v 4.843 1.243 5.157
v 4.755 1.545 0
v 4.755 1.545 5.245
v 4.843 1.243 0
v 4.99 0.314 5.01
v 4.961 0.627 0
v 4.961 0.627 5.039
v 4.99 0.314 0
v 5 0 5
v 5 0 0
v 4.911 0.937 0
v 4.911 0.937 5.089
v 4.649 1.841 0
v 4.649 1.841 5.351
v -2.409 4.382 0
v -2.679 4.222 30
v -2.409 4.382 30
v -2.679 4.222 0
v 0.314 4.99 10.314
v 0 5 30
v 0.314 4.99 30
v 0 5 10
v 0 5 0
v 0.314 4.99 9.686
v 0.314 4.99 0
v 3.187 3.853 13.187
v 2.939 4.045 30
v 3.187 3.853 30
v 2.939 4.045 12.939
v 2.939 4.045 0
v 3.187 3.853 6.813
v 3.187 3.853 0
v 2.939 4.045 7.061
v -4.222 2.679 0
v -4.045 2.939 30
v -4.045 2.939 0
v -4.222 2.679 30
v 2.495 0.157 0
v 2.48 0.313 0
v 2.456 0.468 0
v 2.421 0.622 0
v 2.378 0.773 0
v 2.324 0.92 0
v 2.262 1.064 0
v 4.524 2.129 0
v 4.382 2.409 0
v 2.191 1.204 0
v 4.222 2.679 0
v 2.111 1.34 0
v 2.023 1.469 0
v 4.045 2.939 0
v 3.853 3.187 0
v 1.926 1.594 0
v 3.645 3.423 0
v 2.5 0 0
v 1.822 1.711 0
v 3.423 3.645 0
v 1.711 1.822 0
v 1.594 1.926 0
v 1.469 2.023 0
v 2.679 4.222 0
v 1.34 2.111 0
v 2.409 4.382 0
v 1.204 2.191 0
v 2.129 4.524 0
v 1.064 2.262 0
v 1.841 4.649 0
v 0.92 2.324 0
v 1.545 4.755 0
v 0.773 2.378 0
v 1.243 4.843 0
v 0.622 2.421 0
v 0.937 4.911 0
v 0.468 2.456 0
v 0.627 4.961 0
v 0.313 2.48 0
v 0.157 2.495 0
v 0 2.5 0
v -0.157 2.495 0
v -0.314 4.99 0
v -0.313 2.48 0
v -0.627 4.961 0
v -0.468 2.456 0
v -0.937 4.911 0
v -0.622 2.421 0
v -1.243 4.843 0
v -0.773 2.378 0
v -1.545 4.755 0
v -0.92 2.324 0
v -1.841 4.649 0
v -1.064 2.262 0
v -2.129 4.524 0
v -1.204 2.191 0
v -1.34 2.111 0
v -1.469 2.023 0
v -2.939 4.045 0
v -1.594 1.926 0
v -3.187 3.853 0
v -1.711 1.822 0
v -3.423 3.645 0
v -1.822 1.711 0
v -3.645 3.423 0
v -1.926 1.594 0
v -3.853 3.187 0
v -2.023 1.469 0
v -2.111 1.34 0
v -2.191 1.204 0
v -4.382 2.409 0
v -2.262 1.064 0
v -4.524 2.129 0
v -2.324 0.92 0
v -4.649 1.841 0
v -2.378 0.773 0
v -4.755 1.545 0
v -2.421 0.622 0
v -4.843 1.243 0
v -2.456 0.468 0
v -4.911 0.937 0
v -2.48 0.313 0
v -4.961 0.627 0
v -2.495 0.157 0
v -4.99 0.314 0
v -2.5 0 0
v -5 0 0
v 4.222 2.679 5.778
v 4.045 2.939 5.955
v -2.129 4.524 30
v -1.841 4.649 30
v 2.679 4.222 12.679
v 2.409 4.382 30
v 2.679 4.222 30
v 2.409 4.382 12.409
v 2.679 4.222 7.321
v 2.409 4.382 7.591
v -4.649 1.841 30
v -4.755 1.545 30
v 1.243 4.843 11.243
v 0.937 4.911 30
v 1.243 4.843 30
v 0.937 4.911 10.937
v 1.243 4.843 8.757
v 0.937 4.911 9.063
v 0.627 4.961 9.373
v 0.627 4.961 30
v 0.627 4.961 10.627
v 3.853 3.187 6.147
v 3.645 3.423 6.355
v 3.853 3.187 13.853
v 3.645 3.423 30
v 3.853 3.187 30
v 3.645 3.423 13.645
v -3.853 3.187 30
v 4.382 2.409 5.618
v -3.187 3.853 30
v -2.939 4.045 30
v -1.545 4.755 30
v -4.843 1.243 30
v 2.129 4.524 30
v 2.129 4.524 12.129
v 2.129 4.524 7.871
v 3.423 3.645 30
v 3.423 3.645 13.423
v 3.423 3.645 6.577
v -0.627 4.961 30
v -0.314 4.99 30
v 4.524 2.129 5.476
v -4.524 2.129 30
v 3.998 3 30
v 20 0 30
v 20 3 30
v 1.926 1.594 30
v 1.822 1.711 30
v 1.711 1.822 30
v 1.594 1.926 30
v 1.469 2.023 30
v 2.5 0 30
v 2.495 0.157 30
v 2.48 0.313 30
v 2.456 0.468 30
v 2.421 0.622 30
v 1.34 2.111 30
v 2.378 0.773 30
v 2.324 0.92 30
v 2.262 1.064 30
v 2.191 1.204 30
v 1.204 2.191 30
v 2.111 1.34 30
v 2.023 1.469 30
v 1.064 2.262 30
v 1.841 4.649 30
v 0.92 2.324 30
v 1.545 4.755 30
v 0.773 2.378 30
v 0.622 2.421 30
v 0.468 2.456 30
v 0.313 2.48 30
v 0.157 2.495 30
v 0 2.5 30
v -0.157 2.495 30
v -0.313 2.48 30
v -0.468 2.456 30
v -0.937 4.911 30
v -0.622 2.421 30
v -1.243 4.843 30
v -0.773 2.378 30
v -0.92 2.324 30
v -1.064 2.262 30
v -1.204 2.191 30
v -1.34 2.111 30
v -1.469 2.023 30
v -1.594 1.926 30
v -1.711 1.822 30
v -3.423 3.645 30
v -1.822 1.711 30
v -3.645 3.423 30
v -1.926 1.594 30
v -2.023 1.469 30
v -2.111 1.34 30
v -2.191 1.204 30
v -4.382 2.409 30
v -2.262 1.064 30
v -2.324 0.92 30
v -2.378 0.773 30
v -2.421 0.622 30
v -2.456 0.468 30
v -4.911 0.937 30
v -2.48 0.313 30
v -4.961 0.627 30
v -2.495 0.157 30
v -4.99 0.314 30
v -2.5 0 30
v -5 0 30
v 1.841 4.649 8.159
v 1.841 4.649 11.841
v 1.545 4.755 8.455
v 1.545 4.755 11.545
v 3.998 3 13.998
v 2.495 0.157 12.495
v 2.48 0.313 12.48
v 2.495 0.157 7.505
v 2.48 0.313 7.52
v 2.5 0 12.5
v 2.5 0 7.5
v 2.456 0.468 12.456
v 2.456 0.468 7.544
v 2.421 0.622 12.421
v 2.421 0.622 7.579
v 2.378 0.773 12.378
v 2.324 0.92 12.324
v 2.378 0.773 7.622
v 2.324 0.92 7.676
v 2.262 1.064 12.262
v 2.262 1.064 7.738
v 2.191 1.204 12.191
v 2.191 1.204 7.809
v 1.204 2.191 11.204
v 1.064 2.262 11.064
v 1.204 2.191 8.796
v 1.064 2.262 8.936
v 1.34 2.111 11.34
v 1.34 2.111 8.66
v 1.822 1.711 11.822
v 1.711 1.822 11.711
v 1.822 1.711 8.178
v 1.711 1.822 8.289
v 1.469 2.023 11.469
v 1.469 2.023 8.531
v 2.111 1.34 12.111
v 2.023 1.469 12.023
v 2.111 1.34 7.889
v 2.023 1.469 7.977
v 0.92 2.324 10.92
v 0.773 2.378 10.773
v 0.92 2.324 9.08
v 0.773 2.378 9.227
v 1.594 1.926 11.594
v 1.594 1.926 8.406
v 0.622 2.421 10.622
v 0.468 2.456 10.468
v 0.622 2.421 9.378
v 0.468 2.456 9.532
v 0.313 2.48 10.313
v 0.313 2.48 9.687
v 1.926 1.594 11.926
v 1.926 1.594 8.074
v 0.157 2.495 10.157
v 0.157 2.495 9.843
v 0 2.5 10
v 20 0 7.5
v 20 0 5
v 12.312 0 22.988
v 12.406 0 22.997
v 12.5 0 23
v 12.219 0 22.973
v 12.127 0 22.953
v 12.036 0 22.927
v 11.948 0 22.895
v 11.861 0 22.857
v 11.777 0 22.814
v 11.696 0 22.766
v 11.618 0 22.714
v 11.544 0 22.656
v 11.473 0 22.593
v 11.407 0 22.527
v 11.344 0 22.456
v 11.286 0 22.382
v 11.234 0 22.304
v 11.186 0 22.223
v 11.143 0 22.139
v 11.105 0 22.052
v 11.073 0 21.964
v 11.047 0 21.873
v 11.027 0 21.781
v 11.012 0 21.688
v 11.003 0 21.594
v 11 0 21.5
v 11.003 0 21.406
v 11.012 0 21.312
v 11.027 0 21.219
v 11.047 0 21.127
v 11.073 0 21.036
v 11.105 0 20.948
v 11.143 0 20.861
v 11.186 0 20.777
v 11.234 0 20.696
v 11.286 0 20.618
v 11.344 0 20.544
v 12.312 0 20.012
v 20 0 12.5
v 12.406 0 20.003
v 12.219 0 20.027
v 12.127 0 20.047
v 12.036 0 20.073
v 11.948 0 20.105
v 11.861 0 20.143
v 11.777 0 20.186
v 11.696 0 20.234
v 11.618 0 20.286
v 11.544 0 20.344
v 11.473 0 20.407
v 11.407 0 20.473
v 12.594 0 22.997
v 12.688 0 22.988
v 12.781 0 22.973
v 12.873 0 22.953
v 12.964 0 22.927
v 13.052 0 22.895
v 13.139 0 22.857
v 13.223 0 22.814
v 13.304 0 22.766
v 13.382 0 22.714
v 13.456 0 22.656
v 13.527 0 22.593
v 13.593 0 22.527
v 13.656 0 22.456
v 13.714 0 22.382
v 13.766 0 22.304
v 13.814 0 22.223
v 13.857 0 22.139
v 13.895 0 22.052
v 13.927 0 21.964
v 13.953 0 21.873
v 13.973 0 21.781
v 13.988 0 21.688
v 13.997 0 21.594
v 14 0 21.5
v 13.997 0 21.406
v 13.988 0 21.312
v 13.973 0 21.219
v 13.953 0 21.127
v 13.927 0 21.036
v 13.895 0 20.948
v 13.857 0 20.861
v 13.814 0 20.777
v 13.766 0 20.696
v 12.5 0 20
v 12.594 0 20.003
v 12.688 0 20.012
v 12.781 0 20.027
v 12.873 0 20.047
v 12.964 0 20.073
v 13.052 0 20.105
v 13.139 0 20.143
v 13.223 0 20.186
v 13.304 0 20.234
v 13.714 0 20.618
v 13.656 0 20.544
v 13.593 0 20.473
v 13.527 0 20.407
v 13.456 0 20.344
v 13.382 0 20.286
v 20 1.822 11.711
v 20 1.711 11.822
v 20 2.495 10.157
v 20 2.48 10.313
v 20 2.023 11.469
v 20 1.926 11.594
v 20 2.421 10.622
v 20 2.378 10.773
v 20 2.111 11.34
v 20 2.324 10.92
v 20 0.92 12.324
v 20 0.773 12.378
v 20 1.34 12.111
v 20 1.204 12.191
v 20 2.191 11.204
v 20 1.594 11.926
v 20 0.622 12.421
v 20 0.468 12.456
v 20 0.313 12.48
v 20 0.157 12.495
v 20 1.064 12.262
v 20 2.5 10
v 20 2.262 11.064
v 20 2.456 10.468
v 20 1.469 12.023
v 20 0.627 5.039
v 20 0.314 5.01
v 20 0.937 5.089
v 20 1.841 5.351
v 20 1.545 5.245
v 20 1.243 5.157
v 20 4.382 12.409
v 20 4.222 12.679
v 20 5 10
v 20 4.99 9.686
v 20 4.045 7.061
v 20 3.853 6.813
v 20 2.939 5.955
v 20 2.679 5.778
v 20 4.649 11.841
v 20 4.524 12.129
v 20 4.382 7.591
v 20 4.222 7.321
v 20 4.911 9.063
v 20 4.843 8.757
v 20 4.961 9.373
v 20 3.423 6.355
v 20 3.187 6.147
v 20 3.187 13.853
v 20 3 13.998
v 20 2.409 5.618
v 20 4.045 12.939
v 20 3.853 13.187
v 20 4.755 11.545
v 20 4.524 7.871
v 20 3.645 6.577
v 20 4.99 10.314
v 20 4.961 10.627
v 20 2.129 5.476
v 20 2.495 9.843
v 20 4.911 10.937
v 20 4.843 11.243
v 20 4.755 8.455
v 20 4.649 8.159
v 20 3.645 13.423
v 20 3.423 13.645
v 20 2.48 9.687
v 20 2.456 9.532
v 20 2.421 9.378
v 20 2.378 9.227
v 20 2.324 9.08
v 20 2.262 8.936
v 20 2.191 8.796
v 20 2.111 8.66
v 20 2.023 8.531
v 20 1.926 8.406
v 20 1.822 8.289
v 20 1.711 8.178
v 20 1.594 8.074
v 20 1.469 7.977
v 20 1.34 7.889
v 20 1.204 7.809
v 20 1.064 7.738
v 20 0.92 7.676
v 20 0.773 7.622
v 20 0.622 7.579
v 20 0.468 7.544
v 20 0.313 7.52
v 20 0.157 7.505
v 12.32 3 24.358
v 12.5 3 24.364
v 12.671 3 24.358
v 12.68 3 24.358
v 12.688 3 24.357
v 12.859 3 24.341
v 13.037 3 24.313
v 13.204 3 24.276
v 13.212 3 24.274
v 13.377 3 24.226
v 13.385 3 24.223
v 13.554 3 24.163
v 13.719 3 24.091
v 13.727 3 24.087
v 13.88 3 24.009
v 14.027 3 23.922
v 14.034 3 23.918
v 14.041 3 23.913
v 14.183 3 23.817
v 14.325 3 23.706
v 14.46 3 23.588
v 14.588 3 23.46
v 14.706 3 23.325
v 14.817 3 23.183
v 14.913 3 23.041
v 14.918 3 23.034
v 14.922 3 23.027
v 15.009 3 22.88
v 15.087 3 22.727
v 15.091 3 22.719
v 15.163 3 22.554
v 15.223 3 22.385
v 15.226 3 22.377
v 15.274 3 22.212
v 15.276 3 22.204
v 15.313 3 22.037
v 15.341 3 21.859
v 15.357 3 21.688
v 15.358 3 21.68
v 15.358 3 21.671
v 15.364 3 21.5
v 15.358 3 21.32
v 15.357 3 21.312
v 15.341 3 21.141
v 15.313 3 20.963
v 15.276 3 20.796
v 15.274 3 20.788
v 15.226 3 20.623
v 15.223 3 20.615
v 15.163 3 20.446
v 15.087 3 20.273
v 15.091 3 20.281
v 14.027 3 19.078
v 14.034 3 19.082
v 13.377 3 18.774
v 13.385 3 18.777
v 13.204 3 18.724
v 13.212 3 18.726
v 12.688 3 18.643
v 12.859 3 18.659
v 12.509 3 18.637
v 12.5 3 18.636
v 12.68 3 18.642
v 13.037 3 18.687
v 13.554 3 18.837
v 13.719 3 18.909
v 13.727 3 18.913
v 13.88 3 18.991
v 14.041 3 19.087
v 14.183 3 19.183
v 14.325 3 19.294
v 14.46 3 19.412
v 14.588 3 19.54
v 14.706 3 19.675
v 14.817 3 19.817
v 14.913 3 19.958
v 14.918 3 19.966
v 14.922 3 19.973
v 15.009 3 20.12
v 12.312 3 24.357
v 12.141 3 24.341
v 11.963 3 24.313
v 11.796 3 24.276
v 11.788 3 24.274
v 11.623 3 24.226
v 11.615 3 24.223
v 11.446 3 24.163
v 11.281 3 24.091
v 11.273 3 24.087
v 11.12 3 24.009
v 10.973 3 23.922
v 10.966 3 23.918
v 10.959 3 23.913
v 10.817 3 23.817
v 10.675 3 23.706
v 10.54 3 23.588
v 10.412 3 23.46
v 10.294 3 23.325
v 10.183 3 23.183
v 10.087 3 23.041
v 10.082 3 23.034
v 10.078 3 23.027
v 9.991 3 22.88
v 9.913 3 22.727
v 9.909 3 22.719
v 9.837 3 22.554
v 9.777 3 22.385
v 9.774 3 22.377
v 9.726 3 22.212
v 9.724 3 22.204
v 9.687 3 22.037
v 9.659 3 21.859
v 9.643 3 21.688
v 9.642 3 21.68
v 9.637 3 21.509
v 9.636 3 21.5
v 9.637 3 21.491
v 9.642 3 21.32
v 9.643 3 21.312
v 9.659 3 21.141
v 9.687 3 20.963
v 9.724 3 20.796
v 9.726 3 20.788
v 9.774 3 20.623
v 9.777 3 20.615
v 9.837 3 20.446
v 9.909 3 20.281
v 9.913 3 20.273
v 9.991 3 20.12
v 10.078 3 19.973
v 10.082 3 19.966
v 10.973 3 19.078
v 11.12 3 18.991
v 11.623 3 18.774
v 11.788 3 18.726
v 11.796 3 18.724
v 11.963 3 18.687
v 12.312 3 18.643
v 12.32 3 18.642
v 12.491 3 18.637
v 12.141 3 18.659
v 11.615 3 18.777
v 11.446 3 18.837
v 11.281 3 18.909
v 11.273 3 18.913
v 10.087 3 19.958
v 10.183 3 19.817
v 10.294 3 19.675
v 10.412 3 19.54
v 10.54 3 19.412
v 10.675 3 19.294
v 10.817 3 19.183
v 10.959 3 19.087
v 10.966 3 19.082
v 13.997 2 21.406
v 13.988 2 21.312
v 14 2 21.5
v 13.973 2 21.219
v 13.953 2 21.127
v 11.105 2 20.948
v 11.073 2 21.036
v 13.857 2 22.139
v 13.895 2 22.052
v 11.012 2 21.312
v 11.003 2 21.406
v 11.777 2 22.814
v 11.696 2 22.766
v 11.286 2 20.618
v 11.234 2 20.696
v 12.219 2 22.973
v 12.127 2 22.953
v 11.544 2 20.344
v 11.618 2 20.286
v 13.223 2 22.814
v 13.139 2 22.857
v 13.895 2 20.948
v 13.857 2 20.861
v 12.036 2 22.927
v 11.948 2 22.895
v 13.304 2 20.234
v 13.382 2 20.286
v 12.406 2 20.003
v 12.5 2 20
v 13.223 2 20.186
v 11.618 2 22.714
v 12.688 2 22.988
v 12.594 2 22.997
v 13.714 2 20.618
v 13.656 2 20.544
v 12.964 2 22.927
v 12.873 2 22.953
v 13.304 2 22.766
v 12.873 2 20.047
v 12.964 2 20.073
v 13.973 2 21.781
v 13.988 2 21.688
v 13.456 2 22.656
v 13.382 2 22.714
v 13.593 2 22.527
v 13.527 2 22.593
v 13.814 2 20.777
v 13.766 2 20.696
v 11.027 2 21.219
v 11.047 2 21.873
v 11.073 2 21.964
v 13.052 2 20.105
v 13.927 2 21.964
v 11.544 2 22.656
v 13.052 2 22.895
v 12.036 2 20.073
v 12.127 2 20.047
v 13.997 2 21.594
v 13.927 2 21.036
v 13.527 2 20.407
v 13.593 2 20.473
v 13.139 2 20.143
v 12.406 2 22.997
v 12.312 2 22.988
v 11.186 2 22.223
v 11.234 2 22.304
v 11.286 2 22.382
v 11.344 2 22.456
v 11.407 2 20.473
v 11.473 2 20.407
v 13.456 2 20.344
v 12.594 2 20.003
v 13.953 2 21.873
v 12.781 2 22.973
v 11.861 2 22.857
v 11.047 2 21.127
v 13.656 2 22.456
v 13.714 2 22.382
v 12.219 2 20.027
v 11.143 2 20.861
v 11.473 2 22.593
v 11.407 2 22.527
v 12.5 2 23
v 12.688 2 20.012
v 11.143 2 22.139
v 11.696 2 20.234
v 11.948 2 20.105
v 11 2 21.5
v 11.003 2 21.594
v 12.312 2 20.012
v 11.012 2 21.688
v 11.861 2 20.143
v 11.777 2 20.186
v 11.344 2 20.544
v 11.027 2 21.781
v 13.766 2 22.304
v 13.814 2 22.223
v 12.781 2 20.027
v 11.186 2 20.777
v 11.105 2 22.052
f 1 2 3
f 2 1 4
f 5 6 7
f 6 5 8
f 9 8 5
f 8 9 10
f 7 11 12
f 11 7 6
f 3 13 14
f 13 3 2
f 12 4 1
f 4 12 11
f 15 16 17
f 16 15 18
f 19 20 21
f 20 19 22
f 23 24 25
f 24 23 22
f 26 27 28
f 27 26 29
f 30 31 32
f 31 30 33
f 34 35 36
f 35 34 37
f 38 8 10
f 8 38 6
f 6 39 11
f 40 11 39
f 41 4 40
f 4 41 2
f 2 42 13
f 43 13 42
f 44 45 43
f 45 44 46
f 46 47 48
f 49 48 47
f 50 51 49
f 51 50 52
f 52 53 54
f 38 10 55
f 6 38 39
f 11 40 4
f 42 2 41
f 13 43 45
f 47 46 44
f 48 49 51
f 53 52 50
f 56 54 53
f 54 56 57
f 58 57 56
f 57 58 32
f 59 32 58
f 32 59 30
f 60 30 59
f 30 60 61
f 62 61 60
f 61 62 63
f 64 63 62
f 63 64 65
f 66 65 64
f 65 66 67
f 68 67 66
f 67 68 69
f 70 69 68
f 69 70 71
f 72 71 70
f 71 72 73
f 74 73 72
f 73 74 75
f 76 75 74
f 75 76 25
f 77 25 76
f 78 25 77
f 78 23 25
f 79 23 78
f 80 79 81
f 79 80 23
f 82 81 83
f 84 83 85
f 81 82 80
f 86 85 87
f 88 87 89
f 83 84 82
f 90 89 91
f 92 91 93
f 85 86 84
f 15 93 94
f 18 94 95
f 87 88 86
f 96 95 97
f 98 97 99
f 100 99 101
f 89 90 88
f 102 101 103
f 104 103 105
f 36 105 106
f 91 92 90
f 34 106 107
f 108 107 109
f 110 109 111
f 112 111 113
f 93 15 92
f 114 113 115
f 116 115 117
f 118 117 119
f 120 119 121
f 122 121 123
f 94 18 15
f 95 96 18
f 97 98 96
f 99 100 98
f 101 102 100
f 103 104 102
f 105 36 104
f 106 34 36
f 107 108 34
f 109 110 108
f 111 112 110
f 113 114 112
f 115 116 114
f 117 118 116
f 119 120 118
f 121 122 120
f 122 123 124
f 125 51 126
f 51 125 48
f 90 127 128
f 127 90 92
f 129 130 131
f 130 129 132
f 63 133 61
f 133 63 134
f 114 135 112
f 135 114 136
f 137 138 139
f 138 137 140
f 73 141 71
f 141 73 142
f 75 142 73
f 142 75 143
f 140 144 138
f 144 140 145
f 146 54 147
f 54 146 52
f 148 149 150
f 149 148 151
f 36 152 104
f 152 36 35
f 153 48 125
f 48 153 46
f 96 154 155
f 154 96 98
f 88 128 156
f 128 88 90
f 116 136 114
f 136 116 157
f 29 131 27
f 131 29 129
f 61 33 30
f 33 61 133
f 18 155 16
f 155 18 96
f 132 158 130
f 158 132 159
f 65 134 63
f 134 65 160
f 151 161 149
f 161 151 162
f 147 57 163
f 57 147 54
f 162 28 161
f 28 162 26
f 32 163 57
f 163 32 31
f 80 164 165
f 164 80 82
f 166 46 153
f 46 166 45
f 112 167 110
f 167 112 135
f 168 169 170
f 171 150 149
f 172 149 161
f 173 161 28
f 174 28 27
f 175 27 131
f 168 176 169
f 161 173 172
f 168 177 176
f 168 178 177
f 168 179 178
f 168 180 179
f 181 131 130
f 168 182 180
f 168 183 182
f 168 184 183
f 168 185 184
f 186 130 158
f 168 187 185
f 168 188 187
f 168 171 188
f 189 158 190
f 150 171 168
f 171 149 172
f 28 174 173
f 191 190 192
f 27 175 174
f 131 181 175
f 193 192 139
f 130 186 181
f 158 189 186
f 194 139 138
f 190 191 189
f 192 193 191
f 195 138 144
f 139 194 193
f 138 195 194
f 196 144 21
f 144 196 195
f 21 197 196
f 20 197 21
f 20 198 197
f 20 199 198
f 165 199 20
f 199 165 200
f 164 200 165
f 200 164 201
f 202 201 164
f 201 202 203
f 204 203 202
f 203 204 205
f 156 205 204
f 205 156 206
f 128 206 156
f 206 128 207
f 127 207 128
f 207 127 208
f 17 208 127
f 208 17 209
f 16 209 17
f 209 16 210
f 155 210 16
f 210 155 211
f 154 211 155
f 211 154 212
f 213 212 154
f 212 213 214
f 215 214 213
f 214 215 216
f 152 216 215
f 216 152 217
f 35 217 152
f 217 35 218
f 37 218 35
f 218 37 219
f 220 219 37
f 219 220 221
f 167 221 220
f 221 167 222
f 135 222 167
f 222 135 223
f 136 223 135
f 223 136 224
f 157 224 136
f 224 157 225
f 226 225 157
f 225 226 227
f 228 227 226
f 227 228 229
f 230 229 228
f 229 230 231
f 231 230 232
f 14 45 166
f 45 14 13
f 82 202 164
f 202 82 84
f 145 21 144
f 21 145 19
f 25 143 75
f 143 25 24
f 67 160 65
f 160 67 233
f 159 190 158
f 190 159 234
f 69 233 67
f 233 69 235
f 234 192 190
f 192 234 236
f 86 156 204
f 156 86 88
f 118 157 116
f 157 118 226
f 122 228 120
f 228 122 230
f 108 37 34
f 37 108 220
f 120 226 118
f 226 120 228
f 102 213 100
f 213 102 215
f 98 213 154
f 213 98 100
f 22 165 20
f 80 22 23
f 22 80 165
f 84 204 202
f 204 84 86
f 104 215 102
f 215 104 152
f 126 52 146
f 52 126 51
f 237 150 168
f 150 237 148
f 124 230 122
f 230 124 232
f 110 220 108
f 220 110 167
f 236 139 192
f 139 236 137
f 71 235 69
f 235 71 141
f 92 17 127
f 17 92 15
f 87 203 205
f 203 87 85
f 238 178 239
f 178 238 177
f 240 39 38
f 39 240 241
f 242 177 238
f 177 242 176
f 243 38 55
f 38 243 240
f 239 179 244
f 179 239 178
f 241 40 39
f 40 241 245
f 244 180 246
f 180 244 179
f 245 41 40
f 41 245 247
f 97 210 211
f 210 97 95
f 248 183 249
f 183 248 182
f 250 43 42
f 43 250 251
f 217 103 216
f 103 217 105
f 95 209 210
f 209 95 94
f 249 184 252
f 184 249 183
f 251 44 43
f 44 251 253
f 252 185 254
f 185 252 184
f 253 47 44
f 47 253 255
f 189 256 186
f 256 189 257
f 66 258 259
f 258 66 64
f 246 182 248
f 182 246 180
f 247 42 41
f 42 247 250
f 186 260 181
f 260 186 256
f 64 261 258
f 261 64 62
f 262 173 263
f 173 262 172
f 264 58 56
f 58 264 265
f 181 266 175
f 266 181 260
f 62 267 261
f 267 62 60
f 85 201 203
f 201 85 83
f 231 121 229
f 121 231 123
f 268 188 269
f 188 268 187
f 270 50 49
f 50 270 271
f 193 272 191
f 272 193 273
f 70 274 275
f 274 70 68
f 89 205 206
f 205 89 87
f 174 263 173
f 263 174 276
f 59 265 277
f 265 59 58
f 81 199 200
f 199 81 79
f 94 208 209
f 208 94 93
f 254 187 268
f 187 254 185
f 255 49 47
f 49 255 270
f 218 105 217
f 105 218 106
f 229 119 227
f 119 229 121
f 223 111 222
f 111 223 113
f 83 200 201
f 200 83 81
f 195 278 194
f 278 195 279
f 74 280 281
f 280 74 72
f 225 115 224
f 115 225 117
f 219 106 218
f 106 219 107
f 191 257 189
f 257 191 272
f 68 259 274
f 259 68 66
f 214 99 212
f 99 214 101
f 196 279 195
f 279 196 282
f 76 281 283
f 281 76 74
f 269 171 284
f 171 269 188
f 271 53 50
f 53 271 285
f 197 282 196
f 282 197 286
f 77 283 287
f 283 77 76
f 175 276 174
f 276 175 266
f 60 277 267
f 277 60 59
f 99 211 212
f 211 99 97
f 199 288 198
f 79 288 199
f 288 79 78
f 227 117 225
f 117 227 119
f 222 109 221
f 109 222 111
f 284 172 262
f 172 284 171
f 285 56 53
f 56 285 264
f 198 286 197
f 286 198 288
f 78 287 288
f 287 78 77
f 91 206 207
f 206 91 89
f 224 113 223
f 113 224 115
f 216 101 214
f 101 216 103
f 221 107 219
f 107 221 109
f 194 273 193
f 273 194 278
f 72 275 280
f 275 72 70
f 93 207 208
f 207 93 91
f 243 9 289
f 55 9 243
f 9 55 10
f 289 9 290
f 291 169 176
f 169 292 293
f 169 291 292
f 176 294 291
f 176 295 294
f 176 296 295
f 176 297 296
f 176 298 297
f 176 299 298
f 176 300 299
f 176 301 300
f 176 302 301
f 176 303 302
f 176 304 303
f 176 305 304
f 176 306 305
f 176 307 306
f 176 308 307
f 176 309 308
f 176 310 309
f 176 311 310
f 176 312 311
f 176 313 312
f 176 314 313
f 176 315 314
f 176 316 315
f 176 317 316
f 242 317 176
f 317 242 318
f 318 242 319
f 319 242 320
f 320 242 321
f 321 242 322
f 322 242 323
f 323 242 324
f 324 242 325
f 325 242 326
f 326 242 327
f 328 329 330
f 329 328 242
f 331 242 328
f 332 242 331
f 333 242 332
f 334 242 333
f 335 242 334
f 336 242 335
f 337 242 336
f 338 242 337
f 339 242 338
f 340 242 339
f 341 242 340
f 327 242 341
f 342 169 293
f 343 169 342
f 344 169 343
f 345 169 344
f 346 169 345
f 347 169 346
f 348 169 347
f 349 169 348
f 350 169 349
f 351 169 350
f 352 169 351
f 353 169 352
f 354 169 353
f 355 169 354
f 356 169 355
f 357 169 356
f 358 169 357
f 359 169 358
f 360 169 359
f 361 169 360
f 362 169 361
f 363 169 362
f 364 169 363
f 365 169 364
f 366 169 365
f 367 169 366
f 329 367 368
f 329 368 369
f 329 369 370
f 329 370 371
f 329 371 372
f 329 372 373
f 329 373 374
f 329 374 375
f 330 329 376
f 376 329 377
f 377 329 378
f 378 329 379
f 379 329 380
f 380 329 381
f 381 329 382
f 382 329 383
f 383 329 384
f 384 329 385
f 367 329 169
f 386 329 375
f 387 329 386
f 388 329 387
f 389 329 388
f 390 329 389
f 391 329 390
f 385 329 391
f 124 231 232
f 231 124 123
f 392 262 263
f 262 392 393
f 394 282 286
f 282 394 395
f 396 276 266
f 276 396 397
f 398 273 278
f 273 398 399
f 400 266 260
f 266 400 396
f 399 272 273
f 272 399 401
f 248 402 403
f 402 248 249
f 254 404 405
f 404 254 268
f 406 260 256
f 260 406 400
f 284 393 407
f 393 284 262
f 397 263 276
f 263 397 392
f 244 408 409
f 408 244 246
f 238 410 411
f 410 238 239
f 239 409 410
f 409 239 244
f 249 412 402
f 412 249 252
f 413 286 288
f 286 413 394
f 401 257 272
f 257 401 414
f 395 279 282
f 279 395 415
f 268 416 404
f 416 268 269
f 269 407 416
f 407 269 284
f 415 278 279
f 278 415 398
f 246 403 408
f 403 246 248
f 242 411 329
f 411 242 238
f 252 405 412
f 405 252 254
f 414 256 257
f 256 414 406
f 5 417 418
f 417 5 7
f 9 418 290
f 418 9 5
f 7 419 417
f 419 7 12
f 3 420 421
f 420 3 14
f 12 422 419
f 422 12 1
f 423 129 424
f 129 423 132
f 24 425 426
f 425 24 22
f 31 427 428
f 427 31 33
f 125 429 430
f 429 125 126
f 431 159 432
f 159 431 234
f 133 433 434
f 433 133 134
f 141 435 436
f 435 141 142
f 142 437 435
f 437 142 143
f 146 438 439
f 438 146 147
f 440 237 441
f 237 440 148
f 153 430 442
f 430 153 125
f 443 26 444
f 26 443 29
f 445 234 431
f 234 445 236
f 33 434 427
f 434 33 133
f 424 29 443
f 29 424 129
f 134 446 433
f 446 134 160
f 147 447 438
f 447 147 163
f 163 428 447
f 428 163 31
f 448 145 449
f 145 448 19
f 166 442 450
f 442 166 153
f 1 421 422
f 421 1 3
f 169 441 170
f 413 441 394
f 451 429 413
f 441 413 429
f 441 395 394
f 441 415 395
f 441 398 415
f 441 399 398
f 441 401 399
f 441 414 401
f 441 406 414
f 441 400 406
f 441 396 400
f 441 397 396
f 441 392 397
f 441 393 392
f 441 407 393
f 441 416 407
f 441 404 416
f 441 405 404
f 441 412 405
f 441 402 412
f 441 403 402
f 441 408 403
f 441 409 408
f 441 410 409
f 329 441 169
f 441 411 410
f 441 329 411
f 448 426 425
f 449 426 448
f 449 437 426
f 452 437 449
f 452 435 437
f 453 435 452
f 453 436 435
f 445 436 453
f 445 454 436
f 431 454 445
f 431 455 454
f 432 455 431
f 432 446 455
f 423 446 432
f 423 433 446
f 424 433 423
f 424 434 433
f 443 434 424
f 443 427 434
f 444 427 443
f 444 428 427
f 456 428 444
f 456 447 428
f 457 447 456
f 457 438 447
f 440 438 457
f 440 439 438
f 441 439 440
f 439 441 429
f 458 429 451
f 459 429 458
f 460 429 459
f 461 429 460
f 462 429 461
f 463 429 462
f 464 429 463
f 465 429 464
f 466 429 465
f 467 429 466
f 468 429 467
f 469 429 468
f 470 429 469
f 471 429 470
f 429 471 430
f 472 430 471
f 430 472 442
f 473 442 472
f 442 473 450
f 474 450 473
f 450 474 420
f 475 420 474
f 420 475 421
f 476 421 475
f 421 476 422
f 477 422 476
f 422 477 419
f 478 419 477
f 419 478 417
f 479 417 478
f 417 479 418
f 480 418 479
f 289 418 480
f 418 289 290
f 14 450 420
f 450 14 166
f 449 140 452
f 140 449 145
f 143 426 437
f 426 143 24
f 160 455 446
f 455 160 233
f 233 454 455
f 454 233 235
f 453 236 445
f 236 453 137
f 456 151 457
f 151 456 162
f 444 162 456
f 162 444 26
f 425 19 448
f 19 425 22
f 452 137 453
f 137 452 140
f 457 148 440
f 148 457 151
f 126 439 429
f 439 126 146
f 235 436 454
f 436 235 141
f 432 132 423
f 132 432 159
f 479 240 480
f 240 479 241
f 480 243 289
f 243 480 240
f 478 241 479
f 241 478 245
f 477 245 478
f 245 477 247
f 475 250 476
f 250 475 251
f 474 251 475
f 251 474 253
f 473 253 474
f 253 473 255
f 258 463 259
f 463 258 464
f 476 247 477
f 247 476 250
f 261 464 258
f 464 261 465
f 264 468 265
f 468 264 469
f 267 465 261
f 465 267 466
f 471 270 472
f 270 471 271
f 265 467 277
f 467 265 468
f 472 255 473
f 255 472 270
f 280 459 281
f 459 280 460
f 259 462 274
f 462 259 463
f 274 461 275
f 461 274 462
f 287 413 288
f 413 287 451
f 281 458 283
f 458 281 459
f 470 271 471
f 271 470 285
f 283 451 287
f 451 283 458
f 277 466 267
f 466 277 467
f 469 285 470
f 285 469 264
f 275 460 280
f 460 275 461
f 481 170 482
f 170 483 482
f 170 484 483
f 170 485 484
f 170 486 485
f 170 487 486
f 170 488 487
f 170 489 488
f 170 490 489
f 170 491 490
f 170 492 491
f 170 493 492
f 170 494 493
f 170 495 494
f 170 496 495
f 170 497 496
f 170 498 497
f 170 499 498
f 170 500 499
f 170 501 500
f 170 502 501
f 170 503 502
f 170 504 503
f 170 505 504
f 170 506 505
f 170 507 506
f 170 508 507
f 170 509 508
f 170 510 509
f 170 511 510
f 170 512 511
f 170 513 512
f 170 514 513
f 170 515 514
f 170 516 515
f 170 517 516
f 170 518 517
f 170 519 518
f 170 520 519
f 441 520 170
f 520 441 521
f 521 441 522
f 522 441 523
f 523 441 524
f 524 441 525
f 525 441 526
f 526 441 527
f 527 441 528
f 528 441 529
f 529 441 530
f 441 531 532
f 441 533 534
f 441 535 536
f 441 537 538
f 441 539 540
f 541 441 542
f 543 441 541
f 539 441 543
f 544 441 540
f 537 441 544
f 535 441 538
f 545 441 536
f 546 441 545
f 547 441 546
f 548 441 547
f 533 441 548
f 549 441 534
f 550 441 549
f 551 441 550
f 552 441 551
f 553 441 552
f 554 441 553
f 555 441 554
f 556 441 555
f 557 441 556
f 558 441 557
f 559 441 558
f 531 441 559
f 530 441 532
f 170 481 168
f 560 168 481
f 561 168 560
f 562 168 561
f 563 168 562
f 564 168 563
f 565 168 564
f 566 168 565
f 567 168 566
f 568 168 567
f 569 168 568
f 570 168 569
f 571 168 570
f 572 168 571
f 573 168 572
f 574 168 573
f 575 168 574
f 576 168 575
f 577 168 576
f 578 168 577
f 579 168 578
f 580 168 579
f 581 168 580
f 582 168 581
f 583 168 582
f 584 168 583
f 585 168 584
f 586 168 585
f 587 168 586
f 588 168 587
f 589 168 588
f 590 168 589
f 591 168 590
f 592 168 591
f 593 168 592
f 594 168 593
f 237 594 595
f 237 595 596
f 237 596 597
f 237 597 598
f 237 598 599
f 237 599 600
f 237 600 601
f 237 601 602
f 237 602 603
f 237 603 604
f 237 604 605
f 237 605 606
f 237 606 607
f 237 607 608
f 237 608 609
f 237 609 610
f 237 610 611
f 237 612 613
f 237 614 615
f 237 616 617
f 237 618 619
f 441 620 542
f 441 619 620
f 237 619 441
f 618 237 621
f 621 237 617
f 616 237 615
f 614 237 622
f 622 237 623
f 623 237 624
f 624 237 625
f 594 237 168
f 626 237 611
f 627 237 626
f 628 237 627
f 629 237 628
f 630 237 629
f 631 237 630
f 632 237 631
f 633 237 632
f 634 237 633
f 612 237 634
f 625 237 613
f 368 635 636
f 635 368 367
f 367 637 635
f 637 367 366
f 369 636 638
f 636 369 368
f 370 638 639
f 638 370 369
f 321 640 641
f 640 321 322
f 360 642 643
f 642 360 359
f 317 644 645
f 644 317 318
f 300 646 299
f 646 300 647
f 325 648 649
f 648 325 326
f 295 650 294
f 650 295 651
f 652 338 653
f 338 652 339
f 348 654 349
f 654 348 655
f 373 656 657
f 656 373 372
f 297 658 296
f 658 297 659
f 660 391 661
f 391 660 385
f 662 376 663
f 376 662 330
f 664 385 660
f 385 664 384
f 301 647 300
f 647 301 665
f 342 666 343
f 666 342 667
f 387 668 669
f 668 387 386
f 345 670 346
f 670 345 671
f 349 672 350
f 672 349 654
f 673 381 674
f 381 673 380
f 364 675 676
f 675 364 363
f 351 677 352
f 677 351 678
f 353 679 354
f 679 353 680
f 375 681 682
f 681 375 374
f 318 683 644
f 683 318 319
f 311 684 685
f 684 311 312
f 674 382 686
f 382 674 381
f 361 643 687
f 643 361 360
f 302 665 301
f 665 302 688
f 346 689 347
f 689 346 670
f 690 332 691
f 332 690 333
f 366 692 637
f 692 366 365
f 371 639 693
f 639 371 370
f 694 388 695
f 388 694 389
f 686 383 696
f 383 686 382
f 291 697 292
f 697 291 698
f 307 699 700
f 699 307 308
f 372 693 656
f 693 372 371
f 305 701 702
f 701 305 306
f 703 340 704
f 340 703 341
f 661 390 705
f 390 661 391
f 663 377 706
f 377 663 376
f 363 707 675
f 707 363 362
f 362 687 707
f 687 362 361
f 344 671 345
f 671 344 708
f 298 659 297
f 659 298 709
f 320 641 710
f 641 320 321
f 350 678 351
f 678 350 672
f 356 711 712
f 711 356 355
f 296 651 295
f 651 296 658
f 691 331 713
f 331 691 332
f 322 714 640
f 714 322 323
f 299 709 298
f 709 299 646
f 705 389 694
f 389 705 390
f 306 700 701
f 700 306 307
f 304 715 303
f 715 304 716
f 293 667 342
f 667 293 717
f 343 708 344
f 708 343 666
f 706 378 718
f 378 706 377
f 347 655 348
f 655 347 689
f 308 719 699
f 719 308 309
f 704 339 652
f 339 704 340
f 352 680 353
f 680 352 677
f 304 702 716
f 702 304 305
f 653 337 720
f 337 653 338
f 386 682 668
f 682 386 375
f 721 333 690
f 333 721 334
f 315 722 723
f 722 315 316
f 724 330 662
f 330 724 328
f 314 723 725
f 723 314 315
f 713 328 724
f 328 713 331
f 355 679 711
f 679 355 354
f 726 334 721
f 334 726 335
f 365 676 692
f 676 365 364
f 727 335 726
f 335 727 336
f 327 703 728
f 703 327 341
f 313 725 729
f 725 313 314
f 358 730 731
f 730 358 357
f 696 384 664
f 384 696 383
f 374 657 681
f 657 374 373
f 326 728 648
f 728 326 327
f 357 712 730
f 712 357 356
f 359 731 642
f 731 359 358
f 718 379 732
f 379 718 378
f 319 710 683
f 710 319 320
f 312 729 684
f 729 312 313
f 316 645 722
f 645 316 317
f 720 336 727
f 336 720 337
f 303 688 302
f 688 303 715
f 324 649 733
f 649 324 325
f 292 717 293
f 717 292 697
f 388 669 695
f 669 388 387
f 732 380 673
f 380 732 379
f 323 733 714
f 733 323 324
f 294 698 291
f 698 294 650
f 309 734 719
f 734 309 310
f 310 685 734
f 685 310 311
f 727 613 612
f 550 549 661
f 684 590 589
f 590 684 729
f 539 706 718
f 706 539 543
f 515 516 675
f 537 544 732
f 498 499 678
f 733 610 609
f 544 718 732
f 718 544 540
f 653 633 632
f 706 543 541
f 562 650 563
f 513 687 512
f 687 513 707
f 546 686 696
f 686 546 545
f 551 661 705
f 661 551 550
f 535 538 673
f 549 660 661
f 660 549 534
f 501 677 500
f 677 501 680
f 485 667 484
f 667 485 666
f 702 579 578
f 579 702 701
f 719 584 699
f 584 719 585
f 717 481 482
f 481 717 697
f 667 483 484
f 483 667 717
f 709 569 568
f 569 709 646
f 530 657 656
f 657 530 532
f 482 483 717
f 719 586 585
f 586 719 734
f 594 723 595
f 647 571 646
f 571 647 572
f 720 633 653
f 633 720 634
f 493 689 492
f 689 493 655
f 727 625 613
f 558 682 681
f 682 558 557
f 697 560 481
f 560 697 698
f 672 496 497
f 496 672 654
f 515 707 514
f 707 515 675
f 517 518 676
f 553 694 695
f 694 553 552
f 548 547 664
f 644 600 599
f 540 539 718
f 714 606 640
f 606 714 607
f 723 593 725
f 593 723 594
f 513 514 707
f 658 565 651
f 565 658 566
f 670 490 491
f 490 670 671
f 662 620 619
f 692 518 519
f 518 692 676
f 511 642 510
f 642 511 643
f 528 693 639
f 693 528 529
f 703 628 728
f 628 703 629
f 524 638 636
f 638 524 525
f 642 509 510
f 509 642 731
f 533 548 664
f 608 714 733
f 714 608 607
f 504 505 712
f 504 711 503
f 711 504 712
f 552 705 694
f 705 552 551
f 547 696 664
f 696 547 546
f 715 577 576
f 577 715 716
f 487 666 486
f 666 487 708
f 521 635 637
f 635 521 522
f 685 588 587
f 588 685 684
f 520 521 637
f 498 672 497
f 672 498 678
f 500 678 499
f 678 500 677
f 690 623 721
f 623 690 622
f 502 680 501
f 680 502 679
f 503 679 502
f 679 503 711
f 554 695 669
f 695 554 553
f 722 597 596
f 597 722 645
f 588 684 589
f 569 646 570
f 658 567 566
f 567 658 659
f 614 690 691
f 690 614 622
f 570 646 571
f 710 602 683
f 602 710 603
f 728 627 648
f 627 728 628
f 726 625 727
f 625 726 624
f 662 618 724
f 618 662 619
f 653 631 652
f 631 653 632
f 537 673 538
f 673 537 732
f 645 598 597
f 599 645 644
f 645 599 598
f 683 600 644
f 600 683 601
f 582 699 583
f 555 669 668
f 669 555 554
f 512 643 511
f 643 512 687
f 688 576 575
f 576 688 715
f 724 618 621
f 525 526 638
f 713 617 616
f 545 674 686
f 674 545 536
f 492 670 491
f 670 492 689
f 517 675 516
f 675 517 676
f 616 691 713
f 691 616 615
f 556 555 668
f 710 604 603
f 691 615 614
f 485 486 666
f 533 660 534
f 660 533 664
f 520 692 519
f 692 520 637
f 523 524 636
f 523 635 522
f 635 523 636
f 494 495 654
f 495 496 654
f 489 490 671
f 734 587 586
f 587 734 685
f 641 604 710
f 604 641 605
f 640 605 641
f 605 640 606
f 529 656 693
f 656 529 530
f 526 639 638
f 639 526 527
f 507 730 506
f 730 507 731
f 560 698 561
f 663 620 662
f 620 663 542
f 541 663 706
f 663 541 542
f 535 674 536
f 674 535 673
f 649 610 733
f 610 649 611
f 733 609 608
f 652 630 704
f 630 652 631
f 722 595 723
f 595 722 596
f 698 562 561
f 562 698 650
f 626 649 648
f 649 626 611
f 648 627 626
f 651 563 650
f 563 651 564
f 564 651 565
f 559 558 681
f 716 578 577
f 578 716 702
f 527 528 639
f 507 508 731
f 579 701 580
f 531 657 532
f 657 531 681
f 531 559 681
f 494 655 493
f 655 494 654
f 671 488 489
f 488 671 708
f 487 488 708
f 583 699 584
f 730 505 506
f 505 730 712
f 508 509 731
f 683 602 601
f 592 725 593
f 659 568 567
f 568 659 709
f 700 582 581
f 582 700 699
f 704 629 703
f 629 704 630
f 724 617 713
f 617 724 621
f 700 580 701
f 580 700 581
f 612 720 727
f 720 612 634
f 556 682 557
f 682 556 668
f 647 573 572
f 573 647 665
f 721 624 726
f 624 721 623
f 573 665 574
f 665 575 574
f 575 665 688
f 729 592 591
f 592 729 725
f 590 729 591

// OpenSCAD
$fn=100;

union() {
    difference() {
        cylinder(d=10, h=30);
        translate([0, 0, -0.5]) cylinder(d=5, h=31);
        translate([-5, -10, -0.5]) cube([10, 10, 31]);
        translate([0, 0, 10]) rotate([0, 90, 0]) cylinder(d=5, h=20);
    }
    translate([0, 0, 10]) rotate([0, 90, 0]) difference() {
        cylinder(d=10, h=20);
        translate([-5, 0, 0]) rotate([0, 90, 0]) cylinder(d=5, h=20);
        translate([-5, -10, -0.5]) cube([10, 10, 21]);
        translate([0, 0, -0.5]) cylinder(d=5, h=21);
    }
    difference() {
        translate([2.5, 0, 12.5]) cube([17.5, 3, 17.5]);
        translate([12.5, -0.5, 21.5]) rotate([270, 0, 0]) cylinder(r=1.5, h=4);
        translate([12.5, 2, 21.5]) rotate([270, 0, 0]) cylinder(r1=1.5, r2=3, h=1.1);
    }
}
